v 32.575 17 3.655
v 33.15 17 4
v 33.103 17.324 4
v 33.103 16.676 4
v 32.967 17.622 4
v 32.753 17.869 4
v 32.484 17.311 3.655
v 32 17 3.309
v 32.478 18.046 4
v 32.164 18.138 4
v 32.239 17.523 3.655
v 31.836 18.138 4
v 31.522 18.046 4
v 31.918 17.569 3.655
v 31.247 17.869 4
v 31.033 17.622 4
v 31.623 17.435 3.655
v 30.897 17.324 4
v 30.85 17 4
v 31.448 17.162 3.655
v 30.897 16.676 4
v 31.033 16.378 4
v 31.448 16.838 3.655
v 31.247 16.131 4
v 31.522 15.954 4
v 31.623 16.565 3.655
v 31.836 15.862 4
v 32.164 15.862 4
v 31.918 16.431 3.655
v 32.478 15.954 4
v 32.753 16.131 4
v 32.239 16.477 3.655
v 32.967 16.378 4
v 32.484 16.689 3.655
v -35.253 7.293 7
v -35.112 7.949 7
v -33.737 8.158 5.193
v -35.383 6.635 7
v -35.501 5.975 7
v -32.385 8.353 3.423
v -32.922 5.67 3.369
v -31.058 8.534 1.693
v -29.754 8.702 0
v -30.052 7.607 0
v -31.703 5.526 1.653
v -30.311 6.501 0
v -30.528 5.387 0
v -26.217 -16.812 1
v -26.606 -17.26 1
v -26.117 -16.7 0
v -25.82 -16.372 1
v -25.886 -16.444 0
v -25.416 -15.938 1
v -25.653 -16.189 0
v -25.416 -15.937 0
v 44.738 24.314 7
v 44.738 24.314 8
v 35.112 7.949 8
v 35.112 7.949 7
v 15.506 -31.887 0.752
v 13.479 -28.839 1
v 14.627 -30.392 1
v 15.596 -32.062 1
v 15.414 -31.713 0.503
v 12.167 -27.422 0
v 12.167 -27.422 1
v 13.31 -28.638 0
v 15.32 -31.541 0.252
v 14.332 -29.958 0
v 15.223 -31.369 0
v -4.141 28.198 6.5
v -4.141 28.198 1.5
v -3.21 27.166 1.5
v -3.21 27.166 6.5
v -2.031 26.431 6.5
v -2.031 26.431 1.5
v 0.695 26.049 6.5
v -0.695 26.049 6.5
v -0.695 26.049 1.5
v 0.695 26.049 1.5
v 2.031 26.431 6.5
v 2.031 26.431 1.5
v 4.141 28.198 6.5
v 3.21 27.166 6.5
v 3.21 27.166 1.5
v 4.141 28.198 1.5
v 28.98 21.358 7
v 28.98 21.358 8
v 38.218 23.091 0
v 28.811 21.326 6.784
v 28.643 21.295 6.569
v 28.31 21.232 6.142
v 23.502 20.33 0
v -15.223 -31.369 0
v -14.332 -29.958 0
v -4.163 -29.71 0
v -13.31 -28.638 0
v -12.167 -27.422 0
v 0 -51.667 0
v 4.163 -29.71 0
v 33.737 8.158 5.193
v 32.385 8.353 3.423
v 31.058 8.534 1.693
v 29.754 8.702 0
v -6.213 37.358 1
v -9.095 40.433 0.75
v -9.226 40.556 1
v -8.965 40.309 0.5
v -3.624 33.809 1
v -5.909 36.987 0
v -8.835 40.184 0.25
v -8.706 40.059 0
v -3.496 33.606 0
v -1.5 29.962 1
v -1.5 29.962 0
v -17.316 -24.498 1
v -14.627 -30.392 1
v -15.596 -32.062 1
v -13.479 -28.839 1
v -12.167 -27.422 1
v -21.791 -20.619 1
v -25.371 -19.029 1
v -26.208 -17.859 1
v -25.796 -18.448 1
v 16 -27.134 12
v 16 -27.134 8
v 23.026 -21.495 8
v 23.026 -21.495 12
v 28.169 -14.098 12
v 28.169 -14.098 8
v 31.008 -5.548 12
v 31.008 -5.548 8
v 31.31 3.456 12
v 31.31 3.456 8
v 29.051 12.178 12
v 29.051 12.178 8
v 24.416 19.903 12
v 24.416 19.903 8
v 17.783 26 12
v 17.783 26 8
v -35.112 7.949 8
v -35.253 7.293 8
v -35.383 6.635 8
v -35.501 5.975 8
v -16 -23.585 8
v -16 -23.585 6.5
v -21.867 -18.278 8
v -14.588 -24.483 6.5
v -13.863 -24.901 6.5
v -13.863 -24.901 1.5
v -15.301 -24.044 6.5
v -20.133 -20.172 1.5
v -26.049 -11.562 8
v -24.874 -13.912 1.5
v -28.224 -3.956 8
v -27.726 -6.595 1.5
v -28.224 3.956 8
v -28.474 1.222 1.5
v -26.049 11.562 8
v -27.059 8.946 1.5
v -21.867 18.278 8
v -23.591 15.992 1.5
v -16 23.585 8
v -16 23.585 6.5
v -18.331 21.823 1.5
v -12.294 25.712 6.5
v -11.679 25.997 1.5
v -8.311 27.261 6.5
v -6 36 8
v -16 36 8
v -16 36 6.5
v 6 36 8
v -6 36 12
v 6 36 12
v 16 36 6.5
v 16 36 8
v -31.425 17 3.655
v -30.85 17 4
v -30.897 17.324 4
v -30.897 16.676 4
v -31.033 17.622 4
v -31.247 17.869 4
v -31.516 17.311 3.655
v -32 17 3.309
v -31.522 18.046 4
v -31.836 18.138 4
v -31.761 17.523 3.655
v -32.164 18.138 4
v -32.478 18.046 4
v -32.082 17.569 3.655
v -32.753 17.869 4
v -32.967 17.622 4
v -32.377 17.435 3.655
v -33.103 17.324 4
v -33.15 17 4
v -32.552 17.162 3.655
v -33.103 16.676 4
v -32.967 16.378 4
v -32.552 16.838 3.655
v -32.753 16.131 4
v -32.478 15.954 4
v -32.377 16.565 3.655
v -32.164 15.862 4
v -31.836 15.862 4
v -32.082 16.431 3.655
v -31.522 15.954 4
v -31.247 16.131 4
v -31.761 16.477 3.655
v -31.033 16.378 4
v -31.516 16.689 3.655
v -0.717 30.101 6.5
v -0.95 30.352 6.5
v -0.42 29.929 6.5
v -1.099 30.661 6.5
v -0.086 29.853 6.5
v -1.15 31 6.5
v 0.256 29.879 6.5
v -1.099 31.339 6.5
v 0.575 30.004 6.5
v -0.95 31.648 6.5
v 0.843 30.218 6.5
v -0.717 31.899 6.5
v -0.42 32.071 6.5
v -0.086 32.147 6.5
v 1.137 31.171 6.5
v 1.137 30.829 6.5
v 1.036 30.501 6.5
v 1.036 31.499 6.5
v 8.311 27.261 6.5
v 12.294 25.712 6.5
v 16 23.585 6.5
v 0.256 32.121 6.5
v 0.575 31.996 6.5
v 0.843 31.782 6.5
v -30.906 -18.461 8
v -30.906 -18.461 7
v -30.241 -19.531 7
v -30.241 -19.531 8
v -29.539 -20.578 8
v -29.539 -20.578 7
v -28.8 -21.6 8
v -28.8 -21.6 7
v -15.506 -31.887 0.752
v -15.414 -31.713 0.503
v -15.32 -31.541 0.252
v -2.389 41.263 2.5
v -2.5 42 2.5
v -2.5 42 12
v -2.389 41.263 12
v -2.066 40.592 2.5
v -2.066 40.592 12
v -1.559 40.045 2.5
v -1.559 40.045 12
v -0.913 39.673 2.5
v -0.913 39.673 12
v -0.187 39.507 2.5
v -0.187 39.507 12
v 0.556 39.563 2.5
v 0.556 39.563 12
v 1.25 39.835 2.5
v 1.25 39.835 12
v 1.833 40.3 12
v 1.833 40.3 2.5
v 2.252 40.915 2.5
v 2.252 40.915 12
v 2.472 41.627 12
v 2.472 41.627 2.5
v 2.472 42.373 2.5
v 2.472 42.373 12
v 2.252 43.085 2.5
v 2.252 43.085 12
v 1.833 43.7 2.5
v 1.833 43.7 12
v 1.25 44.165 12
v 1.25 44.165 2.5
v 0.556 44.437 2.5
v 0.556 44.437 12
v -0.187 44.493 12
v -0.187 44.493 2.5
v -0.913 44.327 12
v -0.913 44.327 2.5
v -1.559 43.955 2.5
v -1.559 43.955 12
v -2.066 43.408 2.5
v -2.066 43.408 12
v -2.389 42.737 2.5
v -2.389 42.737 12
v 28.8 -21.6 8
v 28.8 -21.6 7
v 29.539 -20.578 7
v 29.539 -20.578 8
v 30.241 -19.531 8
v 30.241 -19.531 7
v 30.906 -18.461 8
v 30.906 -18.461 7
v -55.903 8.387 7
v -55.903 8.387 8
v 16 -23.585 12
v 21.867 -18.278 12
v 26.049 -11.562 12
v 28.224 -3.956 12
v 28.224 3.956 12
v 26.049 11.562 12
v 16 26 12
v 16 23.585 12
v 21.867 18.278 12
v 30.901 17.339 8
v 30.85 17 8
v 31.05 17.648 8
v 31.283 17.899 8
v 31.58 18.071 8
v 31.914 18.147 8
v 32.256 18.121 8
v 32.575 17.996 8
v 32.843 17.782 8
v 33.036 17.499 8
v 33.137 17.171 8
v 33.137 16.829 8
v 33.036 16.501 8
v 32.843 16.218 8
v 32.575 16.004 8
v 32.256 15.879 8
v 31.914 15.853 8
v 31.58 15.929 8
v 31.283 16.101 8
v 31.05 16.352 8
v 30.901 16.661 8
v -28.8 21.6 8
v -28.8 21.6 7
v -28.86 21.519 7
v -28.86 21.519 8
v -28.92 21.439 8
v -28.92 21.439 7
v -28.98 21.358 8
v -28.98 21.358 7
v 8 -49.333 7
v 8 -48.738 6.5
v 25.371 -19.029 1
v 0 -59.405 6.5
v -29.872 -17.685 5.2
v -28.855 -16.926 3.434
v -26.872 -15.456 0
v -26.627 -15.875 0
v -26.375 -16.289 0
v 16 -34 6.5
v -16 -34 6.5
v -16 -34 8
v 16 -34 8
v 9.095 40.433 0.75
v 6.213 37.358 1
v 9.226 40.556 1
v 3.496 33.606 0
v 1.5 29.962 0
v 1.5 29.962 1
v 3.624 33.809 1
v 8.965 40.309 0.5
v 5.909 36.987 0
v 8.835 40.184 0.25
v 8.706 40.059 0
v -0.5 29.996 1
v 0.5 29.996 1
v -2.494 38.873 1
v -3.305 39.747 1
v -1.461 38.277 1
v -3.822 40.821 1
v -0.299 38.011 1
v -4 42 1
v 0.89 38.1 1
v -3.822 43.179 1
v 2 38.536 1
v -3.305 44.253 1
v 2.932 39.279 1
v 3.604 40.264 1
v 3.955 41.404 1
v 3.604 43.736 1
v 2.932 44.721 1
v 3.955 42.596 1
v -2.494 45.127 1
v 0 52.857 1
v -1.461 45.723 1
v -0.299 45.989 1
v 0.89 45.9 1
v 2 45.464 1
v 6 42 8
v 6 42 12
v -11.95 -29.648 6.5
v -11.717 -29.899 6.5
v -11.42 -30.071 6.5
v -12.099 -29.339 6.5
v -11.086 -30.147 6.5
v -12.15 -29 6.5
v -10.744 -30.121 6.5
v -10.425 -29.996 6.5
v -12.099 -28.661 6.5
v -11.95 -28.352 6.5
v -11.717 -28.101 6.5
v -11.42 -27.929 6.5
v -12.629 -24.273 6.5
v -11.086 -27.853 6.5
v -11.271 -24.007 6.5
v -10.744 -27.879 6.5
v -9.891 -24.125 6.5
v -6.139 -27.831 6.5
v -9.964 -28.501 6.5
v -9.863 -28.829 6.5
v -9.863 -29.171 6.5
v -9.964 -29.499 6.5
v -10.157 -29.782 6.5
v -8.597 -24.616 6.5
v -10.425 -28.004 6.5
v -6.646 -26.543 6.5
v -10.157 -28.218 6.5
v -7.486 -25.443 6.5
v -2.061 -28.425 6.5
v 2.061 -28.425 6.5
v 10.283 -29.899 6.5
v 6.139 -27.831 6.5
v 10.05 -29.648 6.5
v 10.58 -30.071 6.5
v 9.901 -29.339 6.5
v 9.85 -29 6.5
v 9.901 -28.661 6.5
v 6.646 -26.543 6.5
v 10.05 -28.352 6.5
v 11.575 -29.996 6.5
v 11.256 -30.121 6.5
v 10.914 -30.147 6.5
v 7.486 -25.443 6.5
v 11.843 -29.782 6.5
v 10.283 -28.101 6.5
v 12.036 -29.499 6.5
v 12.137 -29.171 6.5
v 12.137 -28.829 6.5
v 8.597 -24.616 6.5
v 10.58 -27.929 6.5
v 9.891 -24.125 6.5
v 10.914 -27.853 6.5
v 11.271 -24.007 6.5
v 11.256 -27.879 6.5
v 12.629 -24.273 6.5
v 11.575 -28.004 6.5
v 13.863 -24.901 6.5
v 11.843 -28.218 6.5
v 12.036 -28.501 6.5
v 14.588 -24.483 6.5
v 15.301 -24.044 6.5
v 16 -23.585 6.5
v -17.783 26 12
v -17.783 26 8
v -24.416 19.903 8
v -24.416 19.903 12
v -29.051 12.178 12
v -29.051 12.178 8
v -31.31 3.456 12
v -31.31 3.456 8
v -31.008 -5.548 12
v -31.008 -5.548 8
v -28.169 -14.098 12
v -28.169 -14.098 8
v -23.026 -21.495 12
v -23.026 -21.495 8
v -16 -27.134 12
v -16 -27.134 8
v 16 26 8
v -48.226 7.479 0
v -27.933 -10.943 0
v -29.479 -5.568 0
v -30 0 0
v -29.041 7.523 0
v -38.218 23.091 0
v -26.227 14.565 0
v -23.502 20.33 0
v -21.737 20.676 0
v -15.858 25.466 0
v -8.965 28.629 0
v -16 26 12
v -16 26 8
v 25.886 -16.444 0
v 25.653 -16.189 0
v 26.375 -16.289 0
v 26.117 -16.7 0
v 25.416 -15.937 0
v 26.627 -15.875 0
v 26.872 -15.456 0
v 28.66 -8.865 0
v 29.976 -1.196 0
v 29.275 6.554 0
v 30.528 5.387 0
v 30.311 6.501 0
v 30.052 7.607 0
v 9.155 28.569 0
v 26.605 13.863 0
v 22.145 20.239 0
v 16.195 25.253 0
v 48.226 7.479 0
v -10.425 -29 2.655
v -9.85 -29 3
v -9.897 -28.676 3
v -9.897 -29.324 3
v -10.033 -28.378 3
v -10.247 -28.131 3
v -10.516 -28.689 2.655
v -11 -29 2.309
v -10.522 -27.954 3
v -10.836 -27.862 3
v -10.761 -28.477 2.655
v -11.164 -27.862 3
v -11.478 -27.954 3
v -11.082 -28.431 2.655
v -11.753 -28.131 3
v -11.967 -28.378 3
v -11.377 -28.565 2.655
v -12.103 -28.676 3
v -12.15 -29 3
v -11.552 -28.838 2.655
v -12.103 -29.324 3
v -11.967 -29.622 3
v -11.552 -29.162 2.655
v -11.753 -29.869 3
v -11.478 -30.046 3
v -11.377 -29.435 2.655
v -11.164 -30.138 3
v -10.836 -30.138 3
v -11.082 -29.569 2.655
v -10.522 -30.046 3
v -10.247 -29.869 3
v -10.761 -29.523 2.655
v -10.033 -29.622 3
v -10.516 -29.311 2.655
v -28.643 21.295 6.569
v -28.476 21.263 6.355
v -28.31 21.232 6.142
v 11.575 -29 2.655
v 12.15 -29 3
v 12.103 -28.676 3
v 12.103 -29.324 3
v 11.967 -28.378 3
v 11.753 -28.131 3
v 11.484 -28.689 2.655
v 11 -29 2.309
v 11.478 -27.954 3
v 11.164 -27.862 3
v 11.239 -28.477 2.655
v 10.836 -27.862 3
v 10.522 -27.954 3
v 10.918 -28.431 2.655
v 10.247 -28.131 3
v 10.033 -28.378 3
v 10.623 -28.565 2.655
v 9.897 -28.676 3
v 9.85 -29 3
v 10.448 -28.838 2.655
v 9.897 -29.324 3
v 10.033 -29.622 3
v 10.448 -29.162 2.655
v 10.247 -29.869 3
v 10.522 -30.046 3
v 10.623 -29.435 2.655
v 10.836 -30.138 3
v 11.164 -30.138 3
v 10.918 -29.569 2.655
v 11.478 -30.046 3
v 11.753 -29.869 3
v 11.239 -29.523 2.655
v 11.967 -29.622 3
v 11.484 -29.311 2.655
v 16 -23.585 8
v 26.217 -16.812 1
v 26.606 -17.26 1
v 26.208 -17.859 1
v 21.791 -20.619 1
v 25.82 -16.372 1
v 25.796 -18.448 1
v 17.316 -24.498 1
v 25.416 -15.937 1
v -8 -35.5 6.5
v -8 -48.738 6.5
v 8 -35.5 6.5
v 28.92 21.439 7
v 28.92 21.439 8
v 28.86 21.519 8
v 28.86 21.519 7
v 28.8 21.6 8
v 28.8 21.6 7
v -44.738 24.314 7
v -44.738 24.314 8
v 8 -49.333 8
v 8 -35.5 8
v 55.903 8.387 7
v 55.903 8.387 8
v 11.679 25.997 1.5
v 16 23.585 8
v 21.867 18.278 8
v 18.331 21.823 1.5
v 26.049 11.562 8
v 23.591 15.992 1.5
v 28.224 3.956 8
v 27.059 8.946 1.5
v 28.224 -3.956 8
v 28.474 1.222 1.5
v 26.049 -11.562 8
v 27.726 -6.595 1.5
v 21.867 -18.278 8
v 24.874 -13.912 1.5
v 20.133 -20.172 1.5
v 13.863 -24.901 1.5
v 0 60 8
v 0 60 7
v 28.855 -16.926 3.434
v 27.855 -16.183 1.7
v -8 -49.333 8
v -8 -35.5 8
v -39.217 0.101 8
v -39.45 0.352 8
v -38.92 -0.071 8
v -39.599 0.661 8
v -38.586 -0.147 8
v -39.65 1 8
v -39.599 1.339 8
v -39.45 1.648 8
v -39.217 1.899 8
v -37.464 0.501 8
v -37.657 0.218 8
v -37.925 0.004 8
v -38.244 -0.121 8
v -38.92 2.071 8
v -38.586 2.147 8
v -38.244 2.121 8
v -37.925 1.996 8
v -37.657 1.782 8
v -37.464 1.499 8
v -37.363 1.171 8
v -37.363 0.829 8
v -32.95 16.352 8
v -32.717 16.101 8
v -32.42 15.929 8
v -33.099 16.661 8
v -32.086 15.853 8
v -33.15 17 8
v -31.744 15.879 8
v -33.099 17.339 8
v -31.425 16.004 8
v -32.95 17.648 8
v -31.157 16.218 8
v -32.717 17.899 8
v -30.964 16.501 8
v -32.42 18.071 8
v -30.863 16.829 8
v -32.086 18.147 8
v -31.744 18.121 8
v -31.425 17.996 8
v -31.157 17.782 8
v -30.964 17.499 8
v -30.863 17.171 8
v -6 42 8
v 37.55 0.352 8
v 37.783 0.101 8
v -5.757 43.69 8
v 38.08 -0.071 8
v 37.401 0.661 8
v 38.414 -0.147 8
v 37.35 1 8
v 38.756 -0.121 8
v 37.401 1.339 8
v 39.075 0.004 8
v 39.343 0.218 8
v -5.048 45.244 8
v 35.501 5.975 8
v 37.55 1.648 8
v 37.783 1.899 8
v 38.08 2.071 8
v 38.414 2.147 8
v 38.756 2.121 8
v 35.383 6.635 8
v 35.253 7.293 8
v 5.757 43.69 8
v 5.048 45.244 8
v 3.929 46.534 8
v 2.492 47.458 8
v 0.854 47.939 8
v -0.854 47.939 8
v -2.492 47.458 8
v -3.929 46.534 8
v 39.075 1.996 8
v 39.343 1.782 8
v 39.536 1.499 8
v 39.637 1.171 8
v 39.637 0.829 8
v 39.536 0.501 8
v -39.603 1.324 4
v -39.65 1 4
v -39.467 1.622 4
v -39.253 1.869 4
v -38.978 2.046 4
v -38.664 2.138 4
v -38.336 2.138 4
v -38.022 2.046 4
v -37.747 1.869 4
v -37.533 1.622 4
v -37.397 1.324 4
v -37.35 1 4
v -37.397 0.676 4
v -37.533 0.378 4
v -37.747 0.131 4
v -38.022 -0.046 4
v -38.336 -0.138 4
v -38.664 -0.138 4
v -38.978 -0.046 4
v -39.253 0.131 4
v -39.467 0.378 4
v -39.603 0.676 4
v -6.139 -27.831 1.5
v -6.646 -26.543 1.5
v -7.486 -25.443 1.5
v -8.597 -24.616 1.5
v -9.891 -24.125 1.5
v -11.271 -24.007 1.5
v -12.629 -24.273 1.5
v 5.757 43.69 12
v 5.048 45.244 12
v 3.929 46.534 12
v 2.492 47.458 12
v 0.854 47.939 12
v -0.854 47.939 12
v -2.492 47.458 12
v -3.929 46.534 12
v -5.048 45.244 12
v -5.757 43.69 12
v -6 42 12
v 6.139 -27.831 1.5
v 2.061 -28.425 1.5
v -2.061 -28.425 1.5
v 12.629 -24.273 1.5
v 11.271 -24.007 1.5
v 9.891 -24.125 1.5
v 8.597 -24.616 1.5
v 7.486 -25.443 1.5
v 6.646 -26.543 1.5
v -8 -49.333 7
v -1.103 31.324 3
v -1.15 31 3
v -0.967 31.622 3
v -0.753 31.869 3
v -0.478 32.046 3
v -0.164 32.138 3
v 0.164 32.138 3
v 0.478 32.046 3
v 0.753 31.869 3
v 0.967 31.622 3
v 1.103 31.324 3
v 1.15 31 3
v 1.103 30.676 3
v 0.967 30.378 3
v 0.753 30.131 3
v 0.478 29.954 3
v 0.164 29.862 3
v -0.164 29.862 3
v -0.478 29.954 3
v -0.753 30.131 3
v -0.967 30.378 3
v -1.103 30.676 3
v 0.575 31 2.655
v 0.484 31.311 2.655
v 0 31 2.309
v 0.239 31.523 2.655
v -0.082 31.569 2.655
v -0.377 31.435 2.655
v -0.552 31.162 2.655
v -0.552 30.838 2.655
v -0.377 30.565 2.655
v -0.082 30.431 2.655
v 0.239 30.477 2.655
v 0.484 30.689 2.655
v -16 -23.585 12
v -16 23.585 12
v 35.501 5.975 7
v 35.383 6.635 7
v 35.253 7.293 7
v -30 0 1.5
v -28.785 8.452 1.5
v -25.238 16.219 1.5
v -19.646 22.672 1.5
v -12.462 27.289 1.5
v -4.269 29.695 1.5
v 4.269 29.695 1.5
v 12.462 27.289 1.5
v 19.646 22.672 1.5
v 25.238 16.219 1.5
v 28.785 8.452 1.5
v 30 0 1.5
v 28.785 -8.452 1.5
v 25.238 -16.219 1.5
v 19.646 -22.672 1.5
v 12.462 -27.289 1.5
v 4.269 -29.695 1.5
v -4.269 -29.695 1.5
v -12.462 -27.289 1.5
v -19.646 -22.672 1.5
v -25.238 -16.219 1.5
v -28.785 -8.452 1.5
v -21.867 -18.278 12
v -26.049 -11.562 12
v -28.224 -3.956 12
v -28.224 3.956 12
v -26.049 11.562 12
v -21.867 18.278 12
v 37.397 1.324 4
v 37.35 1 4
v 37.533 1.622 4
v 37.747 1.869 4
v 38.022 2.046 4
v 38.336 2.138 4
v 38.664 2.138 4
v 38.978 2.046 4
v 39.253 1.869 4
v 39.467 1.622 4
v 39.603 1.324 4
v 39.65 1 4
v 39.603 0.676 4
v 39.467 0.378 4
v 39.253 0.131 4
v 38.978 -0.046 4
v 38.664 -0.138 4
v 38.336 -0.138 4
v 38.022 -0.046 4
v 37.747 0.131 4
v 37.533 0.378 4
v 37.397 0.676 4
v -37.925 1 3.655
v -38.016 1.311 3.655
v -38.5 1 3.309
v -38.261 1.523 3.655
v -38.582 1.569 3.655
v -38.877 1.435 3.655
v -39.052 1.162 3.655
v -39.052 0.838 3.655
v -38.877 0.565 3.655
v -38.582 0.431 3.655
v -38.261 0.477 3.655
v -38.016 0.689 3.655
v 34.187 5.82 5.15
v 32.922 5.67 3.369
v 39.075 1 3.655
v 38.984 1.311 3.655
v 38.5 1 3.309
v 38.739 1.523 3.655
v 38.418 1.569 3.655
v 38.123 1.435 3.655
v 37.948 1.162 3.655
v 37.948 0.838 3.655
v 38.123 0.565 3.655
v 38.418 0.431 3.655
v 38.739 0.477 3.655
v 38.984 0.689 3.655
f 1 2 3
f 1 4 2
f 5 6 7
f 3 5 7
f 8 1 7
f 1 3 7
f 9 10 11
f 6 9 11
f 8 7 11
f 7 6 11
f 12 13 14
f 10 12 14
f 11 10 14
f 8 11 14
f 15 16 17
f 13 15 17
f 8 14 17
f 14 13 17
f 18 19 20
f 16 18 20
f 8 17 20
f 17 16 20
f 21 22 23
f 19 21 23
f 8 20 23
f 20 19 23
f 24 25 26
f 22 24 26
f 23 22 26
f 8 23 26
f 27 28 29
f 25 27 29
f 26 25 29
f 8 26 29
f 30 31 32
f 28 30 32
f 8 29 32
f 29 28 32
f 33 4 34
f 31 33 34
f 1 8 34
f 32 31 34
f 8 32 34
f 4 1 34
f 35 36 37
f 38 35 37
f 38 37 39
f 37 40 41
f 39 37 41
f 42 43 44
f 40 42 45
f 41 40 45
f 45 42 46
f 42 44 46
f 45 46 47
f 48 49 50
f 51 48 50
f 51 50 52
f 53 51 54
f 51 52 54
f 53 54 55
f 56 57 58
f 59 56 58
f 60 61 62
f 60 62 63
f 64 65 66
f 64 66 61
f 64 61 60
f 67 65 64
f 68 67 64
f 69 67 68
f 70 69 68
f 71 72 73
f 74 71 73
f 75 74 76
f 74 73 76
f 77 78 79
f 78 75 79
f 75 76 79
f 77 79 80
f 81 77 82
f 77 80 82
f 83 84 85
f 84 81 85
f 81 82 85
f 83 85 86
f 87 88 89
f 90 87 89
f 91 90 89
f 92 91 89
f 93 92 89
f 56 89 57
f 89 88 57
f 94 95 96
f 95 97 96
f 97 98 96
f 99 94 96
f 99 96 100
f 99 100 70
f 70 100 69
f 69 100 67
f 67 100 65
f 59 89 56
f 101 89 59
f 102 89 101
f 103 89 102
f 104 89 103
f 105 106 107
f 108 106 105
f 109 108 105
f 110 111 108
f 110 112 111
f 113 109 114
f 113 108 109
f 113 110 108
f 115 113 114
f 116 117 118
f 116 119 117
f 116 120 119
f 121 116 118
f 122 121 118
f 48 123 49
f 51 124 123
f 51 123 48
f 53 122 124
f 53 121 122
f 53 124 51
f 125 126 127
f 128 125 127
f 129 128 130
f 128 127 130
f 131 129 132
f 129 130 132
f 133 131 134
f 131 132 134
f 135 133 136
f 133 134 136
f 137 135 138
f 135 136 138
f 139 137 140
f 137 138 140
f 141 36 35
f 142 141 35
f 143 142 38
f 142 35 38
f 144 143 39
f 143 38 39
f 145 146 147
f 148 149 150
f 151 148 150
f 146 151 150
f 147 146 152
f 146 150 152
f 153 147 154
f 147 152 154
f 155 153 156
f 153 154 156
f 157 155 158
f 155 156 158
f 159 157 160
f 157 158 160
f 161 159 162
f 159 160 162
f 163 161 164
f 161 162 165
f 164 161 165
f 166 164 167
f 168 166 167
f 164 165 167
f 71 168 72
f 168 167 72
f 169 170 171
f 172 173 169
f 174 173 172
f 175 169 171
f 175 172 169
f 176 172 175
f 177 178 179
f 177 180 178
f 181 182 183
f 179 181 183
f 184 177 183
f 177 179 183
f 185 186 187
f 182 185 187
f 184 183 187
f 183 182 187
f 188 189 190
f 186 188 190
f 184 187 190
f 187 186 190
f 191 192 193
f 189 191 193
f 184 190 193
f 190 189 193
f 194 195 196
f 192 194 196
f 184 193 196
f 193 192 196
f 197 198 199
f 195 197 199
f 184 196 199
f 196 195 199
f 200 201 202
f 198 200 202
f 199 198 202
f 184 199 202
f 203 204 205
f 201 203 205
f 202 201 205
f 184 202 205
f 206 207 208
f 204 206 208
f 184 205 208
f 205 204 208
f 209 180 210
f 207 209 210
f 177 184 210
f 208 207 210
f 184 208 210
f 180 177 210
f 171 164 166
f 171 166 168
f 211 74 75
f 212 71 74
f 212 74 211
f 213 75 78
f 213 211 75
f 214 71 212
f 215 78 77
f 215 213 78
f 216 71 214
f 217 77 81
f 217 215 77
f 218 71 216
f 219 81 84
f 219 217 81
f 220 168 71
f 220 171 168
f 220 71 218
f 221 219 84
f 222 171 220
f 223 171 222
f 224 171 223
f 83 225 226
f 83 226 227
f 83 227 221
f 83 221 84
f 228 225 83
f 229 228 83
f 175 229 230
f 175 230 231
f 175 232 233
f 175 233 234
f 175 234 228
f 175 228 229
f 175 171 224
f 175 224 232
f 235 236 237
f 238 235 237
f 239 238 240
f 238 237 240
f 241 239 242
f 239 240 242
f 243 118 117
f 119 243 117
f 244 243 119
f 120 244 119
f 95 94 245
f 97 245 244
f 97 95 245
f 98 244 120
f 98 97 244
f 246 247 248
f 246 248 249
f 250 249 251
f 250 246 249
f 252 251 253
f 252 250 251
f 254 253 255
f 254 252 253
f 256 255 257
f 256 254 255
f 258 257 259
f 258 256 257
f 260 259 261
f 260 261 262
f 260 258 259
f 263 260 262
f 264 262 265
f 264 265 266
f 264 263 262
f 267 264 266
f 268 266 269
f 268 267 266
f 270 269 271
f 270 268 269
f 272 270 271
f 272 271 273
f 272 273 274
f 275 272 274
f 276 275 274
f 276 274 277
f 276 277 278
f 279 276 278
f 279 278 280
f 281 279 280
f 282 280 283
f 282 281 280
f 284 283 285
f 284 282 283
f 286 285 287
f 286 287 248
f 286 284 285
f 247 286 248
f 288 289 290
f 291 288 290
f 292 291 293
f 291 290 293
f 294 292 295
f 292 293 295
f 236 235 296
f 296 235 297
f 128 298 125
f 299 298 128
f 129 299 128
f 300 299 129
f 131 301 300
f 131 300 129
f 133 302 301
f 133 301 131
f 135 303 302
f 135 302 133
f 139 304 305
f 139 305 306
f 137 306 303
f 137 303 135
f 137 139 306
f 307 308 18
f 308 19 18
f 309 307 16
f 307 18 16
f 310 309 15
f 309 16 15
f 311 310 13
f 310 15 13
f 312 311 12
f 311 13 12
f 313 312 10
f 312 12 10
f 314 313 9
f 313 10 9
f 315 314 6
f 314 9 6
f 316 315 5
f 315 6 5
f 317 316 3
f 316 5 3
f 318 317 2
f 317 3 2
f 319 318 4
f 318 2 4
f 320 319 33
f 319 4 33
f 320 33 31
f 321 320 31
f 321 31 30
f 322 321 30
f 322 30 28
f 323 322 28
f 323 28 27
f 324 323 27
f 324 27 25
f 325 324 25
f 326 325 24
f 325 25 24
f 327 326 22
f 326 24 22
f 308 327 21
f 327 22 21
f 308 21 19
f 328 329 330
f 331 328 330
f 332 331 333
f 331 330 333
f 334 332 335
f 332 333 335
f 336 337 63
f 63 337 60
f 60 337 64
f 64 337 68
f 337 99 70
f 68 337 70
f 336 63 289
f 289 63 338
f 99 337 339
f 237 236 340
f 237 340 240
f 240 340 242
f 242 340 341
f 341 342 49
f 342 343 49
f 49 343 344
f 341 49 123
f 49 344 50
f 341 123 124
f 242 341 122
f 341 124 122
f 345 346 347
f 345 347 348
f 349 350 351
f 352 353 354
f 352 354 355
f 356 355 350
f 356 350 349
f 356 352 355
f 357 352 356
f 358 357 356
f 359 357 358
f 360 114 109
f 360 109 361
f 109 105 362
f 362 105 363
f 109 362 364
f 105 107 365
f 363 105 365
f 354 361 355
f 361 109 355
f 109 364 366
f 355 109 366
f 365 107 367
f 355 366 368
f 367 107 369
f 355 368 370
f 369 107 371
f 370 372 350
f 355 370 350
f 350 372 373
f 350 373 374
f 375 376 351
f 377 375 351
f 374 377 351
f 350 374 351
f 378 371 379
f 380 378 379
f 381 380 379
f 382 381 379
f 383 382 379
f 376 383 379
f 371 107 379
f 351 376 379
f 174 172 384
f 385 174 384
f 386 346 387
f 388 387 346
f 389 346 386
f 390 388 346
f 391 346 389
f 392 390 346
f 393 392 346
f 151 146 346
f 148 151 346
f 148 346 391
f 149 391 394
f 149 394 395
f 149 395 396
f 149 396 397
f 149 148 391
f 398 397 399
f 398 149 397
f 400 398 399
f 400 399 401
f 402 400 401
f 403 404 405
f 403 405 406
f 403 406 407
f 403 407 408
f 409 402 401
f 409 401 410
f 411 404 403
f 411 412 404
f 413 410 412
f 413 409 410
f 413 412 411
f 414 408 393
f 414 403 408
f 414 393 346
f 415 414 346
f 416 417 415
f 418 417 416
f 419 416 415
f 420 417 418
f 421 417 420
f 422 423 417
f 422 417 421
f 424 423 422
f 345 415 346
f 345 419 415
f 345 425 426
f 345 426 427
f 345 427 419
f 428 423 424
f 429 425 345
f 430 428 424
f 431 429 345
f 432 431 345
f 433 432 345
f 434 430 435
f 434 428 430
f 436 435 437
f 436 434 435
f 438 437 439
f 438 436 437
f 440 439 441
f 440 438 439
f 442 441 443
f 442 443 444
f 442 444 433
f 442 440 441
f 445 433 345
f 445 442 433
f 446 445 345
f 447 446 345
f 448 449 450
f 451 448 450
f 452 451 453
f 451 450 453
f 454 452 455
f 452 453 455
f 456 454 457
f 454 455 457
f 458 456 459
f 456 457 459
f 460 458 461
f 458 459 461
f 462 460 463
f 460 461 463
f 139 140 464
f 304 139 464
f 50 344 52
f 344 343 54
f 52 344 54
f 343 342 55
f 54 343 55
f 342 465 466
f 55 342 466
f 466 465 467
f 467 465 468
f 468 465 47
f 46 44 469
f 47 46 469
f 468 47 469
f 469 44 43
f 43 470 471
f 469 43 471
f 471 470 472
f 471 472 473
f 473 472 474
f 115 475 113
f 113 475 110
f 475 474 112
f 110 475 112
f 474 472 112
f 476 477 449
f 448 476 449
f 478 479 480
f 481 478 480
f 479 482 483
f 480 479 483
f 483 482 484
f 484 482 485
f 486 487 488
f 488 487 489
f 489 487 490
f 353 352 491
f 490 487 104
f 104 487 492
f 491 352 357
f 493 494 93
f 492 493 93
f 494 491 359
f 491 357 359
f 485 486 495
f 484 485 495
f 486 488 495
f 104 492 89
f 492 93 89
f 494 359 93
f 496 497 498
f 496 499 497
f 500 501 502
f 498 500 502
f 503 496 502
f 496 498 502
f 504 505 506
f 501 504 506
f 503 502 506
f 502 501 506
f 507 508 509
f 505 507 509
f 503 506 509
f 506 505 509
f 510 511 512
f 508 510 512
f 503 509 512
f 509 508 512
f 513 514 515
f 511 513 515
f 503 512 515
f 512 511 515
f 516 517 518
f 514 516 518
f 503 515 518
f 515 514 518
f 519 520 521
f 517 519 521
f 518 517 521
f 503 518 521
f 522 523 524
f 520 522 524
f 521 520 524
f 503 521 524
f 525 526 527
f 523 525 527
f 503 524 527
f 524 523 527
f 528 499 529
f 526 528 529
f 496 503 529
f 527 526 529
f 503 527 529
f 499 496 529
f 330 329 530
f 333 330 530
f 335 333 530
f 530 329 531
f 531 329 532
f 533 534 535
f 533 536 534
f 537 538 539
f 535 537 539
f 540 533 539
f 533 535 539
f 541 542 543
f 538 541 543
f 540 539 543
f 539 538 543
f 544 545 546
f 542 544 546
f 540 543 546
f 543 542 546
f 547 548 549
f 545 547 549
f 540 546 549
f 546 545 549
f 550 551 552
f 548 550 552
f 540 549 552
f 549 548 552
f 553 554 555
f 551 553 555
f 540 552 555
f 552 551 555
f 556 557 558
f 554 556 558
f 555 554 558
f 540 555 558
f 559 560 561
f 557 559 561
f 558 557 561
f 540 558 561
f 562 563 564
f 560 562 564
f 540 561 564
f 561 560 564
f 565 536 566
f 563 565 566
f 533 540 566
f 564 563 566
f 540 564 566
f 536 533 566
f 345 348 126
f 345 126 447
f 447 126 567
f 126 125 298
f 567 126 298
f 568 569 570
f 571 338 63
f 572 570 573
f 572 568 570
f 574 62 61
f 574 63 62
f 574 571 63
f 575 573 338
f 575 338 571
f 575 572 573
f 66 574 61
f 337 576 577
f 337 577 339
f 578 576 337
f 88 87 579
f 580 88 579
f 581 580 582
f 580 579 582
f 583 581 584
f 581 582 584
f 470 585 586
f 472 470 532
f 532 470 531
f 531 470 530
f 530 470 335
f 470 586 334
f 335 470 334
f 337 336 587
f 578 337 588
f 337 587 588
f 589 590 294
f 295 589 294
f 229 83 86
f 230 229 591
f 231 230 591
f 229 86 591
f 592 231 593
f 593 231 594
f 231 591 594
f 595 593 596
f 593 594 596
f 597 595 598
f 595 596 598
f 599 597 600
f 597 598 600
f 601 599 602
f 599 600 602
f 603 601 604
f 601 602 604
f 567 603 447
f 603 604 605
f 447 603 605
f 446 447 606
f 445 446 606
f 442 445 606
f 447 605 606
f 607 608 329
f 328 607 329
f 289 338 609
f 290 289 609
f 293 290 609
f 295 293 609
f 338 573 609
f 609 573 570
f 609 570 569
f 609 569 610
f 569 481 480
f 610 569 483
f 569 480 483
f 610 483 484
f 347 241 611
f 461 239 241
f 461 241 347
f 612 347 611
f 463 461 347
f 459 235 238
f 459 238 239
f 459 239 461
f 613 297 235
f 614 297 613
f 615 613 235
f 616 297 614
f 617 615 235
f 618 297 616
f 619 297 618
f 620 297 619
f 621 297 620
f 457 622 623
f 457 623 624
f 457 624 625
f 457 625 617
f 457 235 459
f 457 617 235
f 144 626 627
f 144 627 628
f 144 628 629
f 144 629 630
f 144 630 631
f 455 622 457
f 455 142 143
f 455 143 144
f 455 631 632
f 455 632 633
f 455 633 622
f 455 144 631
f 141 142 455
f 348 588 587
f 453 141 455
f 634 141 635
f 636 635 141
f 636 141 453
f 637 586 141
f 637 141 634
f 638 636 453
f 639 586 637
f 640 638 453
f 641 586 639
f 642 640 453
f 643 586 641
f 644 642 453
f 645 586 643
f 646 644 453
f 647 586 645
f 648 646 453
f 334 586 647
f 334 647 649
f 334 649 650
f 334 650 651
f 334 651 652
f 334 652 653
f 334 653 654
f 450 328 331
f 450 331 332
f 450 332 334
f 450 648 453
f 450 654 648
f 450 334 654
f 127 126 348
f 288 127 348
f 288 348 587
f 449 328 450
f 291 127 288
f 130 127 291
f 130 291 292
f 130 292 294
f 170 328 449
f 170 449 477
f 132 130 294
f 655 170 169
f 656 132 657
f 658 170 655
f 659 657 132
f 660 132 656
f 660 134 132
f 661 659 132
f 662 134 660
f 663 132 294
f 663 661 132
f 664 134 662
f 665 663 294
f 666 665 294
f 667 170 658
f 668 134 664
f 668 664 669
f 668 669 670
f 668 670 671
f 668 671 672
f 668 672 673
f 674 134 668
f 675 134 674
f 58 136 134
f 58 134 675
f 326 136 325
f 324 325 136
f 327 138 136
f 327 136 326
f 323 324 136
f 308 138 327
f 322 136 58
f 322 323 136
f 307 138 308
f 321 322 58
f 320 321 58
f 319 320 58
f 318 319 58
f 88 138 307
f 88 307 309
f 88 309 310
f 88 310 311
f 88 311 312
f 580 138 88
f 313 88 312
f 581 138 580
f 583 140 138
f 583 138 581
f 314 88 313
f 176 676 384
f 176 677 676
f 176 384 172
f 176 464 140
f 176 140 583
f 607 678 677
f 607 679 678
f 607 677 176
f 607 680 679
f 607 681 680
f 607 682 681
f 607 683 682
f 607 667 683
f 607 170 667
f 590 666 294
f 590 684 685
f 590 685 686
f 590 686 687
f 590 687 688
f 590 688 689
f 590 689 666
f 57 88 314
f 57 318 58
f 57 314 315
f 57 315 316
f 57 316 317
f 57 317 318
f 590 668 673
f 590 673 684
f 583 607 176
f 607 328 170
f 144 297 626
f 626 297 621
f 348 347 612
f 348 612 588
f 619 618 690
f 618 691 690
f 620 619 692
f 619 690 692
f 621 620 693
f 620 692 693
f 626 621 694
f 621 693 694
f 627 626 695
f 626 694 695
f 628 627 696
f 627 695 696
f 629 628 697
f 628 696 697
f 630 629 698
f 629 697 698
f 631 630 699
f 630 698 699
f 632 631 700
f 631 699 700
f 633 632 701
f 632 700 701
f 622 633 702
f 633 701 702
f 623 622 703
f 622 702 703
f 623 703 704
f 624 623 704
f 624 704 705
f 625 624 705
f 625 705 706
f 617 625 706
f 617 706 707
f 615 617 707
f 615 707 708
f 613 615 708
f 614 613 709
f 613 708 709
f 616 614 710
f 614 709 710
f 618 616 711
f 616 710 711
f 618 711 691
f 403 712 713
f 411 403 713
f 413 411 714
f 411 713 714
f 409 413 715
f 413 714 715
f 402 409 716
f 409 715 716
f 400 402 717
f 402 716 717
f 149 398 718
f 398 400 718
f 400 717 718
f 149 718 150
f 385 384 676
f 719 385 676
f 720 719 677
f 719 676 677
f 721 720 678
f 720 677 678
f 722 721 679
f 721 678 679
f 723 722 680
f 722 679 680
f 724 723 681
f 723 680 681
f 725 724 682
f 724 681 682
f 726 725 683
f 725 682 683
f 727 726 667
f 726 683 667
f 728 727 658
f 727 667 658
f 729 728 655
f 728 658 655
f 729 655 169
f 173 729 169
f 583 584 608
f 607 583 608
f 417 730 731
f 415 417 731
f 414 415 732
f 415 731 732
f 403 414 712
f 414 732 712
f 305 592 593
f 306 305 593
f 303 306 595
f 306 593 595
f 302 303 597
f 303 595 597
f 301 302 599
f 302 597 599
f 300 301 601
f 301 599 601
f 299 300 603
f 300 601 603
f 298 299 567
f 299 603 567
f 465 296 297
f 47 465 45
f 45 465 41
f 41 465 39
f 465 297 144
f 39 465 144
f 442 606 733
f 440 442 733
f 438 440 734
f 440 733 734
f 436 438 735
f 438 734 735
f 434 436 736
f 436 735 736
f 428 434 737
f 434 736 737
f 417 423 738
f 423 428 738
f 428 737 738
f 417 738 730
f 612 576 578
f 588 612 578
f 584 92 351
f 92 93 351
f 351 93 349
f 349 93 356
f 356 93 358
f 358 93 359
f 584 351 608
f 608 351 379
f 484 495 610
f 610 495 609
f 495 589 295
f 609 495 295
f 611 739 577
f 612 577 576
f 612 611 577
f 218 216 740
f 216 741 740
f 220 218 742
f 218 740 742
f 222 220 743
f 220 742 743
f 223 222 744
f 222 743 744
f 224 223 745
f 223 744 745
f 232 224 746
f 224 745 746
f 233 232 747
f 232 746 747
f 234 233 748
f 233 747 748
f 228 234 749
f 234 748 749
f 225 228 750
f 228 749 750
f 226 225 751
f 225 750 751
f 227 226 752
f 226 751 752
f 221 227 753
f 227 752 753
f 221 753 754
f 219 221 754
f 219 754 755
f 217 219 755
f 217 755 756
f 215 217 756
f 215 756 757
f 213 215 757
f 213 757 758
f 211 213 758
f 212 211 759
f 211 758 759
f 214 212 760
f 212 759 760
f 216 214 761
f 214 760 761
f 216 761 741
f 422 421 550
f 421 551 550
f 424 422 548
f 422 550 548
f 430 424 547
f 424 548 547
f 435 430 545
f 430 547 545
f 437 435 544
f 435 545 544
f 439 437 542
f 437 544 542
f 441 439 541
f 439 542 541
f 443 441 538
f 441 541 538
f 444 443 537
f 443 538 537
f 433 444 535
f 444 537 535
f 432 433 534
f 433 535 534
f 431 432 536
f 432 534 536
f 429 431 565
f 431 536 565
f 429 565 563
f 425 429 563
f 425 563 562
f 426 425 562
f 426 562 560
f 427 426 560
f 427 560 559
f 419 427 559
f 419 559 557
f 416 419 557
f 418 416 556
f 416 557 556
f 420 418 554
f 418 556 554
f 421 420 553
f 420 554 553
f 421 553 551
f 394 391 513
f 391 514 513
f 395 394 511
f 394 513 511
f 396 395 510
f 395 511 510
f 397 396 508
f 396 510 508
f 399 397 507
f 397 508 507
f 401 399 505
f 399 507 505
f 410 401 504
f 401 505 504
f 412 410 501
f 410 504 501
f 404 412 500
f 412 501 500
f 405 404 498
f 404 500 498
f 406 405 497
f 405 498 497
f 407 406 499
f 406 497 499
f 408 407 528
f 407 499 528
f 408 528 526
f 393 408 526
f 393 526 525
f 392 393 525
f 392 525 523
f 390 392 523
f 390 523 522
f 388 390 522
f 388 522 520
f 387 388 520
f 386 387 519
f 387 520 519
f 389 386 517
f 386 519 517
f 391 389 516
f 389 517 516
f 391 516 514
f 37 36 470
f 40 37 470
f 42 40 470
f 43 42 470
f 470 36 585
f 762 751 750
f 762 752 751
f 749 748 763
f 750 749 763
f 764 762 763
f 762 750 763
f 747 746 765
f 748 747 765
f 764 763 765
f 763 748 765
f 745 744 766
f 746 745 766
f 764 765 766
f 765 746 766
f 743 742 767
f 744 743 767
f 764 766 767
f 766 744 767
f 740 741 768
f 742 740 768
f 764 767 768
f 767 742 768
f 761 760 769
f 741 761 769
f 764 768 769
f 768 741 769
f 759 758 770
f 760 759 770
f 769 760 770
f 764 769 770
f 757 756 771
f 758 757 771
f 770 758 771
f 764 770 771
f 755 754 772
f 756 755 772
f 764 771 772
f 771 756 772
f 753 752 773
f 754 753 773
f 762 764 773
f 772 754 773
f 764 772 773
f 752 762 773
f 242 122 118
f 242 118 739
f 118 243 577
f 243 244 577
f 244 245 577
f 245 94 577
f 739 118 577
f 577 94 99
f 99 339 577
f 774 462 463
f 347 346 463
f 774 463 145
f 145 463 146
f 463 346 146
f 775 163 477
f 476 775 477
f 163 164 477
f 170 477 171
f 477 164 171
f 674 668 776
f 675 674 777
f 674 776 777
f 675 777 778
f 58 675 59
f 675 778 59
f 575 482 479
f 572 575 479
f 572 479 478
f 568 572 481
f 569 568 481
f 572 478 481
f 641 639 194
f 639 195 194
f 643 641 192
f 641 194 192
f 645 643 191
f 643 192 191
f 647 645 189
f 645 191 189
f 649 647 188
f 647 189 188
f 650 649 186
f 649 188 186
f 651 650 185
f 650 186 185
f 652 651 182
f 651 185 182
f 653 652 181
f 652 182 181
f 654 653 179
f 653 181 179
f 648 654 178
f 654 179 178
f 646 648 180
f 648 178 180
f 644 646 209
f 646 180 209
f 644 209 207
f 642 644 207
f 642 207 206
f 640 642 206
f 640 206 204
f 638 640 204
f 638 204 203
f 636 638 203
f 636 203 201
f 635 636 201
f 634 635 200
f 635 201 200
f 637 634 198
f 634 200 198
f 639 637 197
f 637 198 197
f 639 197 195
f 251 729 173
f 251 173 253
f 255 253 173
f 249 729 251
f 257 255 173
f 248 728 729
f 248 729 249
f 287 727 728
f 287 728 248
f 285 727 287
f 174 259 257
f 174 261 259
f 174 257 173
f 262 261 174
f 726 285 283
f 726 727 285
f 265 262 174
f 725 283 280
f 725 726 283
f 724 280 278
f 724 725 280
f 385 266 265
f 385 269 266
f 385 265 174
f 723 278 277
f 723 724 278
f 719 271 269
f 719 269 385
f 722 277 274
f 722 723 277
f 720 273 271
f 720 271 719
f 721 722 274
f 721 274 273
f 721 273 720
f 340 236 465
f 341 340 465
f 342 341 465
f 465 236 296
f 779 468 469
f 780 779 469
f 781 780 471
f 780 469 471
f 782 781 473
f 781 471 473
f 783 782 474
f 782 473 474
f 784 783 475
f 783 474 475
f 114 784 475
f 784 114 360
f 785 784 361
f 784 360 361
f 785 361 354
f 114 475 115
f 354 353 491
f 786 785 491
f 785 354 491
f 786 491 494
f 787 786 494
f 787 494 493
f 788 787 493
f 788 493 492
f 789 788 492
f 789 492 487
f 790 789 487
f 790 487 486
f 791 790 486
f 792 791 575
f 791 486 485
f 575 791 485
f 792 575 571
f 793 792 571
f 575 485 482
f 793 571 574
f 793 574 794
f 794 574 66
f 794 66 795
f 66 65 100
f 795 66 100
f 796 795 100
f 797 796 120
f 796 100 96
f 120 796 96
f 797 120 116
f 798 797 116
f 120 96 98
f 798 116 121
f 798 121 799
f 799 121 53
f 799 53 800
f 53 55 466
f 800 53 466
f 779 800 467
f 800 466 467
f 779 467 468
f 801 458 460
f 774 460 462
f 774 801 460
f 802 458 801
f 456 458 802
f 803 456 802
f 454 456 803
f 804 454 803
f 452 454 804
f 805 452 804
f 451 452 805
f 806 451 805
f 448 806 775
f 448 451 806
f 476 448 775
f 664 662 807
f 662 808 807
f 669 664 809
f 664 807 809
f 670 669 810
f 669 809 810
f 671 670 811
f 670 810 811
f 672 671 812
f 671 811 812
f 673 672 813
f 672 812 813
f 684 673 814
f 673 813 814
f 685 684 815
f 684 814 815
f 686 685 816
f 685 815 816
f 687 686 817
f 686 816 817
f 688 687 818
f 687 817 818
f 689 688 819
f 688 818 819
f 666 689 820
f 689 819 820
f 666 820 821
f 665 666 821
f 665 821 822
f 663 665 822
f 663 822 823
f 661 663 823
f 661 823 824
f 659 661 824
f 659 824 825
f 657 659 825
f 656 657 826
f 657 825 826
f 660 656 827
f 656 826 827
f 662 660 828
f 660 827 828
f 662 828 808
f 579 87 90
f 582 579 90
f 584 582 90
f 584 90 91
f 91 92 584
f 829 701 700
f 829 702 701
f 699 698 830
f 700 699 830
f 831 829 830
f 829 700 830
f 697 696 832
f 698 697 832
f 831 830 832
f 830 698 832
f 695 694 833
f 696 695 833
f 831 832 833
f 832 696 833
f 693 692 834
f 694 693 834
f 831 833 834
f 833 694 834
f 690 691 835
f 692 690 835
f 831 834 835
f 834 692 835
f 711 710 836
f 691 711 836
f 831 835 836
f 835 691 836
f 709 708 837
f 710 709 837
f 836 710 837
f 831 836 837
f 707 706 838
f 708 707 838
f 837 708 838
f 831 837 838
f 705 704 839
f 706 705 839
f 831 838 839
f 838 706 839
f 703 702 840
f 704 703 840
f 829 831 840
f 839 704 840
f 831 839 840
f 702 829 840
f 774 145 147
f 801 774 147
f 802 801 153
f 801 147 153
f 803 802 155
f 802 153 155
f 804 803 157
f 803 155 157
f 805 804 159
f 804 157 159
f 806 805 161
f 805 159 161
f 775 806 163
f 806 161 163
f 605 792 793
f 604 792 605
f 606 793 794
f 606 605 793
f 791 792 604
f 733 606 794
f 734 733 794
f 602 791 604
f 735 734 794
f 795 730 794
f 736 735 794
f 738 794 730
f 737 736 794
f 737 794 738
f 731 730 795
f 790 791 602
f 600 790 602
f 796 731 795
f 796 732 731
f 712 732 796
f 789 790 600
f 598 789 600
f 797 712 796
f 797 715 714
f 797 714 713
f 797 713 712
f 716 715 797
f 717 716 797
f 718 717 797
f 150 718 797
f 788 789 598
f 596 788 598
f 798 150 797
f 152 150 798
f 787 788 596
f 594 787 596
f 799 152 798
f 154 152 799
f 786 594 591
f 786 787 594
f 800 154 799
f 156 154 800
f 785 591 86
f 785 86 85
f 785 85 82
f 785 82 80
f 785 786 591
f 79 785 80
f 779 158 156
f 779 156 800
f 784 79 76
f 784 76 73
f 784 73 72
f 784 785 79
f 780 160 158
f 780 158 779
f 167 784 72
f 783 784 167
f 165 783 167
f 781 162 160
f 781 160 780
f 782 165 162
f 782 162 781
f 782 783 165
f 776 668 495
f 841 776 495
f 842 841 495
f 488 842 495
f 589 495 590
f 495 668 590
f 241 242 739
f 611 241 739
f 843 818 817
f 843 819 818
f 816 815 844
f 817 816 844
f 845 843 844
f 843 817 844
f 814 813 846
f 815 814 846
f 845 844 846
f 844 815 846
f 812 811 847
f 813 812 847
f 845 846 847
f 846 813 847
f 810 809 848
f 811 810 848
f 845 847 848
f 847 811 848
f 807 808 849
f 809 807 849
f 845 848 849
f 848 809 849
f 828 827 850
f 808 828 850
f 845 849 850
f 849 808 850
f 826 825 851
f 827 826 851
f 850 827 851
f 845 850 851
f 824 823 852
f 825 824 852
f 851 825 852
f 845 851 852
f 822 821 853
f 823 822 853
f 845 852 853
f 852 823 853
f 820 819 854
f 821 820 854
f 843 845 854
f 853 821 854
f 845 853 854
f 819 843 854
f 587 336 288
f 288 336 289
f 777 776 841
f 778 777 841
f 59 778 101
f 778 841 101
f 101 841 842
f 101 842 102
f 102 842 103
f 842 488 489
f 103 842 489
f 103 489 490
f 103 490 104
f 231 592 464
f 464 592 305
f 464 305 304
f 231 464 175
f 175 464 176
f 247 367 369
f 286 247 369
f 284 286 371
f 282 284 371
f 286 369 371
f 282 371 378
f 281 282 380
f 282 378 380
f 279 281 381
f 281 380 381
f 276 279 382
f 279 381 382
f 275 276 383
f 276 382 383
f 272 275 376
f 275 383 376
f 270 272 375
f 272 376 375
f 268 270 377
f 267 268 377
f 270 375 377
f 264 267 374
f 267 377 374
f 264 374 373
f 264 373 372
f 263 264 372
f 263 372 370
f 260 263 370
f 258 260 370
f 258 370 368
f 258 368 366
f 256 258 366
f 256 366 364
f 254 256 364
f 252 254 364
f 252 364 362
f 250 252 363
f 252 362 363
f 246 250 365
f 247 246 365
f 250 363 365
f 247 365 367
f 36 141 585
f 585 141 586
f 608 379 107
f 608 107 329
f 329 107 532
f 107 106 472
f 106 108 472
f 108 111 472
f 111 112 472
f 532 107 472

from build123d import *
from OCP.BRepFilletAPI import BRepFilletAPI_MakeChamfer

# Parameters (mm, degrees)
EXTRUDE_1_DEPTH          = 8
CHAMFER_12_SIZE          = 7
CHAMFER_12_SIZE2         = 5
SKETCH_11_R              = 30
CUT_EXTRUDE_1_DEPTH      = 1.5
EXTRUDE_5_DEPTH          = 8
EXTRUDE_5_2_DEPTH        = 8
EXTRUDE_5_3_DEPTH        = 8
EXTRUDE_5_4_DEPTH        = 8
CHAMFER_13_SIZE          = 5
CHAMFER_13_SIZE2         = 7
CHAMFER_14_SIZE          = 5
CHAMFER_14_SIZE2         = 7
CHAMFER_15_SIZE          = 7
CHAMFER_15_SIZE2         = 5
CHAMFER_16_SIZE          = 5
CHAMFER_16_SIZE2         = 7
SKETCH_23_W              = 32
SKETCH_23_H              = 70
CUT_EXTRUDE_7_DEPTH      = 1.5
SKETCH_13_W              = 16
SKETCH_13_H              = 26
CUT_EXTRUDE_2_DEPTH      = 1.5
HOLE_WIZARD_M2_24_D      = 2.3
HOLE_WIZARD_M2_24_DEPTH  = 3.5
HOLE_WIZARD_M2_24_TIP    = 0.690989712
EXTRUDE_6_DEPTH          = 4
HOLE_WIZARD_M2_25_D      = 2.3
HOLE_WIZARD_M2_25_DEPTH  = 4
HOLE_WIZARD_M2_25_TIP    = 0.690989712
CUT_EXTRUDE_8_DEPTH      = 83.880013818
CUT_EXTRUDE_8_DEPTH_BACK = 83.880013818
SKETCH_32_R              = 2.5
SKETCH_33_W              = 16
SKETCH_33_H              = 1.5
EXTRUDE_7_DEPTH          = 1.5
SKETCH_34_R              = 6
SKETCH_34_R_2            = 2.5
EXTRUDE_8_DEPTH          = 4
CUT_EXTRUDE_9_DEPTH      = 1
SKETCH_15_R              = 35
SKETCH_15_R_2            = 17.5
CUT_EXTRUDE_10_DEPTH     = 1
CHAMFER_18_SIZE          = 1.5


with BuildPart() as part:
    # Эскиз1 → Бобышка-Вытянуть1 (new body)
    with BuildSketch(Plane.XY):
        with BuildLine():
            Line((28.8, 21.6), (0, 60))
            Line((0, 60), (-28.8, 21.6))
            ThreePointArc((-28.8, 21.6), (-36, 0), (-28.8, -21.6))
            Line((-28.8, -21.6), (0, -60))
            Line((0, -60), (28.8, -21.6))
            ThreePointArc((28.8, -21.6), (36, 0), (28.8, 21.6))
        make_face()
        with BuildLine():
            ThreePointArc((4.1408267, 28.197580645), (28.033938924, 5.133056438), (13.863257821, -24.901005654))
            ThreePointArc((13.863257821, -24.901005654), (9.226728829, -24.325012368), (6.138561306, -27.831062953))
            ThreePointArc((6.138561306, -27.831062953), (0, -28.5), (-6.138561306, -27.831062953))
            ThreePointArc((-6.138561306, -27.831062953), (-9.226728829, -24.325012368), (-13.863257821, -24.901005654))
            ThreePointArc((-13.863257821, -24.901005654), (-28.033938924, 5.133056438), (-4.1408267, 28.197580645))
            ThreePointArc((-4.1408267, 28.197580645), (0, 26), (4.1408267, 28.197580645))
        make_face(mode=Mode.SUBTRACT)
    extrude(amount=EXTRUDE_1_DEPTH)

    # Фаска12: one chamfer whose edges measure the first distance from different faces: ONE call of the kernel's chamfer builder (chamfer() names one face for all edges)
    chamfer_12_edges_1 = [part.edges().sort_by_distance(p)[0] for p in [
        (14.4, 40.8, 0),
    ]]
    chamfer_12_side_1 = [part.faces().sort_by_distance(p)[0] for p in [
        (14.4, 40.8, 4),
    ]]
    chamfer_12_edges_2 = [part.edges().sort_by_distance(p)[0] for p in [
        (36, 0, 0),
    ]]
    chamfer_12_side_2 = [part.faces().sort_by_distance(p)[0] for p in [
        (36, 0, 4),
    ]]
    chamfer_12_edges_3 = [part.edges().sort_by_distance(p)[0] for p in [
        (14.4, -40.8, 0),
    ]]
    chamfer_12_side_3 = [part.faces().sort_by_distance(p)[0] for p in [
        (14.4, -40.8, 4),
    ]]
    chamfer_12_edges_4 = [part.edges().sort_by_distance(p)[0] for p in [
        (-14.4, -40.8, 0),
    ]]
    chamfer_12_side_4 = [part.faces().sort_by_distance(p)[0] for p in [
        (-14.4, -40.8, 4),
    ]]
    chamfer_12_edges_5 = [part.edges().sort_by_distance(p)[0] for p in [
        (-36, 0, 0),
    ]]
    chamfer_12_side_5 = [part.faces().sort_by_distance(p)[0] for p in [
        (-36, 0, 4),
    ]]
    chamfer_12_edges_6 = [part.edges().sort_by_distance(p)[0] for p in [
        (-14.4, 40.8, 0),
    ]]
    chamfer_12_side_6 = [part.faces().sort_by_distance(p)[0] for p in [
        (-14.4, 40.8, 4),
    ]]
    chamfer_12 = BRepFilletAPI_MakeChamfer(part.part.solid().wrapped)
    for e in chamfer_12_edges_1:
        chamfer_12.Add(CHAMFER_12_SIZE, CHAMFER_12_SIZE2, e.wrapped, chamfer_12_side_1[0].wrapped)  # the first distance lies on this face
    for e in chamfer_12_edges_2:
        chamfer_12.Add(CHAMFER_12_SIZE, CHAMFER_12_SIZE2, e.wrapped, chamfer_12_side_2[0].wrapped)  # the first distance lies on this face
    for e in chamfer_12_edges_3:
        chamfer_12.Add(CHAMFER_12_SIZE, CHAMFER_12_SIZE2, e.wrapped, chamfer_12_side_3[0].wrapped)  # the first distance lies on this face
    for e in chamfer_12_edges_4:
        chamfer_12.Add(CHAMFER_12_SIZE, CHAMFER_12_SIZE2, e.wrapped, chamfer_12_side_4[0].wrapped)  # the first distance lies on this face
    for e in chamfer_12_edges_5:
        chamfer_12.Add(CHAMFER_12_SIZE, CHAMFER_12_SIZE2, e.wrapped, chamfer_12_side_5[0].wrapped)  # the first distance lies on this face
    for e in chamfer_12_edges_6:
        chamfer_12.Add(CHAMFER_12_SIZE, CHAMFER_12_SIZE2, e.wrapped, chamfer_12_side_6[0].wrapped)  # the first distance lies on this face
    add(Compound.cast(chamfer_12.Shape()), mode=Mode.REPLACE)

    # Эскиз11 → Вырез-Вытянуть1 (cut)
    with BuildSketch(Plane(origin=(0, 0, 0), x_dir=(-1, 0, 0), z_dir=(0, 0, -1))):
        Circle(SKETCH_11_R)
    extrude(amount=-CUT_EXTRUDE_1_DEPTH, mode=Mode.SUBTRACT)


with BuildPart() as body_2:
    # Эскиз17 → Бобышка-Вытянуть5 (new body)
    with BuildSketch(Plane(origin=(0, 0, 8), x_dir=(-1, 0, 0), z_dir=(0, 0, -1))):
        with BuildLine():
            Line((25.238858928, -18), (28.902564257, -20.612903226))
            Line((28.902564257, -20.612903226), (55.902564257, 8.387096774))
            Line((55.902564257, 8.387096774), (30.528334189, 5.387096774))
            ThreePointArc((30.528334189, 5.387096774), (30.236303195, -6.838564841), (25.238858928, -18))
        make_face()
    extrude(amount=EXTRUDE_5_DEPTH)

    # Фаска13
    chamfer_13_edges = [body_2.edges().sort_by_distance(p)[0] for p in [
        (-42.402564257, -6.112903226, 0),
    ]]
    chamfer_13_side = [body_2.faces().sort_by_distance(p)[0] for p in [
        (-38.046204164, -3.085883691, 0),
    ]]
    chamfer(chamfer_13_edges, length=CHAMFER_13_SIZE, length2=CHAMFER_13_SIZE2, reference=chamfer_13_side[0])


with BuildPart() as body_3:
    # Эскиз17 → Extrude 5 2 (new body)
    with BuildSketch(Plane(origin=(0, 0, 8), x_dir=(-1, 0, 0), z_dir=(0, 0, -1))):
        with BuildLine():
            Line((-28.902564257, -20.612903226), (-25.238858928, -18))
            ThreePointArc((-25.238858928, -18), (-30.236303195, -6.838564841), (-30.528334189, 5.387096774))
            Line((-30.528334189, 5.387096774), (-55.902564257, 8.387096774))
            Line((-55.902564257, 8.387096774), (-28.902564257, -20.612903226))
        make_face()
    extrude(amount=EXTRUDE_5_2_DEPTH)

    # Фаска14
    chamfer_14_edges = [body_3.edges().sort_by_distance(p)[0] for p in [
        (42.402564257, -6.112903226, 0),
    ]]
    chamfer_14_side = [body_3.faces().sort_by_distance(p)[0] for p in [
        (38.046204164, -3.085883691, 0),
    ]]
    chamfer(chamfer_14_edges, length=CHAMFER_14_SIZE, length2=CHAMFER_14_SIZE2, reference=chamfer_14_side[0])


with BuildPart() as body_4:
    # Эскиз17 → Extrude 5 3 (new body)
    with BuildSketch(Plane(origin=(0, 0, 8), x_dir=(-1, 0, 0), z_dir=(0, 0, -1))):
        with BuildLine():
            ThreePointArc((23.416468646, 20.314255983), (27.763165047, 13.791543298), (30.334880827, 6.387096774))
            Line((30.334880827, 6.387096774), (34.73833127, 7.314255983))
            Line((34.73833127, 7.314255983), (44.73833127, 24.314255983))
            Line((44.73833127, 24.314255983), (23.416468646, 20.314255983))
        make_face()
    extrude(amount=EXTRUDE_5_3_DEPTH)

    # Фаска16
    chamfer_16_edges = [body_4.edges().sort_by_distance(p)[0] for p in [
        (-39.73833127, 15.814255983, 0),
    ]]
    chamfer_16_side = [body_4.faces().sort_by_distance(p)[0] for p in [
        (-33.811855358, 16.430209574, 0),
    ]]
    chamfer(chamfer_16_edges, length=CHAMFER_16_SIZE, length2=CHAMFER_16_SIZE2, reference=chamfer_16_side[0])


with BuildPart() as body_5:
    # Эскиз17 → Extrude 5 4 (new body)
    with BuildSketch(Plane(origin=(0, 0, 8), x_dir=(-1, 0, 0), z_dir=(0, 0, -1))):
        with BuildLine():
            Line((-34.73833127, 7.314255983), (-30.334880827, 6.387096774))
            ThreePointArc((-30.334880827, 6.387096774), (-27.763165047, 13.791543298), (-23.416468646, 20.314255983))
            Line((-23.416468646, 20.314255983), (-44.73833127, 24.314255983))
            Line((-44.73833127, 24.314255983), (-34.73833127, 7.314255983))
        make_face()
    extrude(amount=EXTRUDE_5_4_DEPTH)

    # Фаска15
    chamfer_15_edges = [body_5.edges().sort_by_distance(p)[0] for p in [
        (39.73833127, 15.814255983, 0),
    ]]
    chamfer_15_side = [body_5.faces().sort_by_distance(p)[0] for p in [
        (39.73833127, 15.814255983, 4),
    ]]
    chamfer(chamfer_15_edges, length=CHAMFER_15_SIZE, length2=CHAMFER_15_SIZE2, reference=chamfer_15_side[0])


with BuildPart() as body_2_1:
    add(body_2.part)

    # Combine 2: union body 3, body 5, body 4, part
    add(body_3.part)
    add(body_5.part)
    add(body_4.part)
    add(part.part)

    # Эскиз23 → Вырез-Вытянуть7 (cut)
    with BuildSketch(Plane.XY.offset(8)):
        with Locations((0, 1)):
            Rectangle(SKETCH_23_W, SKETCH_23_H)
    extrude(amount=-CUT_EXTRUDE_7_DEPTH, mode=Mode.SUBTRACT)

    # Эскиз13 → Вырез-Вытянуть2 (cut)
    with BuildSketch(Plane.XY.offset(8)):
        with Locations((0, -47)):
            Rectangle(SKETCH_13_W, SKETCH_13_H)
    extrude(amount=-CUT_EXTRUDE_2_DEPTH, mode=Mode.SUBTRACT)

    # Сверло под метчик  спиральное M2.24
    with Locations(Plane.XY.offset(6.5)):
        with Locations((0, 31), (-11, -29), (11, -29)):
            Hole(HOLE_WIZARD_M2_24_D / 2, depth=HOLE_WIZARD_M2_24_DEPTH)
            with Locations((0, 0, -(HOLE_WIZARD_M2_24_DEPTH + HOLE_WIZARD_M2_24_TIP / 2))):  # 118° drill point
                Cone(0, HOLE_WIZARD_M2_24_D / 2, HOLE_WIZARD_M2_24_TIP, mode=Mode.SUBTRACT)

    # Эскиз28 → Бобышка-Вытянуть6 (add)
    with BuildSketch(Plane.XY.offset(8)):
        with BuildLine():
            Line((-16, 23.58495283), (-16, 26))
            Line((-16, 26), (-17.783419244, 26))
            ThreePointArc((-17.783419244, 26), (-31.482271301, -1.056689982), (-16, -27.133927102))
            Line((-16, -27.133927102), (-16, -23.58495283))
            ThreePointArc((-16, -23.58495283), (-28.5, 0), (-16, 23.58495283))
        make_face()
        with BuildLine():
            Line((17.783419244, 26), (16, 26))
            Line((16, 26), (16, 23.58495283))
            ThreePointArc((16, 23.58495283), (28.5, 0), (16, -23.58495283))
            Line((16, -23.58495283), (16, -27.133927102))
            ThreePointArc((16, -27.133927102), (31.482271301, -1.056689982), (17.783419244, 26))
        make_face()
    extrude(amount=EXTRUDE_6_DEPTH)

    # Сверло под метчик  спиральное M2.25
    with Locations(Plane.XY.offset(8)):
        with Locations((-32, 17), (-38.5, 1), (32, 17), (38.5, 1)):
            Hole(HOLE_WIZARD_M2_25_D / 2, depth=HOLE_WIZARD_M2_25_DEPTH)
            with Locations((0, 0, -(HOLE_WIZARD_M2_25_DEPTH + HOLE_WIZARD_M2_25_TIP / 2))):  # 118° drill point
                Cone(0, HOLE_WIZARD_M2_25_D / 2, HOLE_WIZARD_M2_25_TIP, mode=Mode.SUBTRACT)

    # Эскиз32 → Вырез-Вытянуть8 (cut, two sides: drawn at the far end of the back side and taken through both)
    with BuildSketch(Plane(origin=(0, 0, 0), x_dir=(-1, 0, 0), z_dir=(0, 0, -1)).offset(-CUT_EXTRUDE_8_DEPTH_BACK)):
        with Locations((0, 42)):
            Circle(SKETCH_32_R)
    extrude(amount=CUT_EXTRUDE_8_DEPTH + CUT_EXTRUDE_8_DEPTH_BACK, mode=Mode.SUBTRACT)

    # Эскиз33 → Бобышка-Вытянуть7 (add)
    with BuildSketch(Plane.XY.offset(6.5)):
        with Locations((0, -34.75)):
            Rectangle(SKETCH_33_W, SKETCH_33_H)
    extrude(amount=EXTRUDE_7_DEPTH)

    # Эскиз34 → Бобышка-Вытянуть8 (add)
    # profile 1 of 3: a face of its own
    with BuildSketch(Plane.XY.offset(8)):
        with Locations((0, 42)):
            Circle(SKETCH_34_R)
        with Locations(Location((0, 42, 0), (0, 0, 180))):
            Circle(SKETCH_34_R_2, mode=Mode.SUBTRACT)
    # profile 2 of 3: a face of its own
    with BuildSketch(Plane.XY.offset(8)):
        with BuildLine():
            Line((6, 36), (6, 42))
            ThreePointArc((6, 42), (4.242640713, 37.757359339), (7.3e-08, 36))
            Line((7.3e-08, 36), (6, 36))
        make_face()
    # profile 3 of 3: a face of its own
    with BuildSketch(Plane.XY.offset(8)):
        with BuildLine():
            ThreePointArc((7.3e-08, 36), (-4.242640661, 37.757359287), (-6, 42))
            Line((-6, 42), (-6, 36))
            Line((-6, 36), (7.3e-08, 36))
        make_face()
    extrude(amount=EXTRUDE_8_DEPTH)

    # Эскиз18 → Вырез-Вытянуть9 (cut)
    with BuildSketch(Plane(origin=(0, 0, 0), x_dir=(-1, 0, 0), z_dir=(0, 0, -1))):
        with BuildLine():
            Line((-12.532635049, 43.289819934), (0, 60))
            Line((0, 60), (12.532635049, 43.289819934))
            ThreePointArc((12.532635049, 43.289819934), (6.179836993, 37.318603148), (1.5, 29.962476533))
            ThreePointArc((1.5, 29.962476533), (0, 30), (-1.5, 29.962476533))
            ThreePointArc((-1.5, 29.962476533), (-6.179836993, 37.318603148), (-12.532635049, 43.289819934))
        make_face()
    extrude(amount=-CUT_EXTRUDE_9_DEPTH, mode=Mode.SUBTRACT)

    # Эскиз15 → Вырез-Вытянуть10 (cut)
    with BuildSketch(Plane(origin=(0, 0, 0), x_dir=(-1, 0, 0), z_dir=(0, 0, -1))):
        with Locations((0, -40)):
            Circle(SKETCH_15_R)
        with Locations((0, -40)):
            Circle(SKETCH_15_R_2, mode=Mode.SUBTRACT)
    extrude(amount=-CUT_EXTRUDE_10_DEPTH, mode=Mode.SUBTRACT)

    # Фаска18
    chamfer_18_edges = [body_2_1.edges().sort_by_distance(p)[0] for p in [
        (2.5, 42, 1),
    ]]
    chamfer(chamfer_18_edges, length=CHAMFER_18_SIZE)


solid = body_2_1.part
